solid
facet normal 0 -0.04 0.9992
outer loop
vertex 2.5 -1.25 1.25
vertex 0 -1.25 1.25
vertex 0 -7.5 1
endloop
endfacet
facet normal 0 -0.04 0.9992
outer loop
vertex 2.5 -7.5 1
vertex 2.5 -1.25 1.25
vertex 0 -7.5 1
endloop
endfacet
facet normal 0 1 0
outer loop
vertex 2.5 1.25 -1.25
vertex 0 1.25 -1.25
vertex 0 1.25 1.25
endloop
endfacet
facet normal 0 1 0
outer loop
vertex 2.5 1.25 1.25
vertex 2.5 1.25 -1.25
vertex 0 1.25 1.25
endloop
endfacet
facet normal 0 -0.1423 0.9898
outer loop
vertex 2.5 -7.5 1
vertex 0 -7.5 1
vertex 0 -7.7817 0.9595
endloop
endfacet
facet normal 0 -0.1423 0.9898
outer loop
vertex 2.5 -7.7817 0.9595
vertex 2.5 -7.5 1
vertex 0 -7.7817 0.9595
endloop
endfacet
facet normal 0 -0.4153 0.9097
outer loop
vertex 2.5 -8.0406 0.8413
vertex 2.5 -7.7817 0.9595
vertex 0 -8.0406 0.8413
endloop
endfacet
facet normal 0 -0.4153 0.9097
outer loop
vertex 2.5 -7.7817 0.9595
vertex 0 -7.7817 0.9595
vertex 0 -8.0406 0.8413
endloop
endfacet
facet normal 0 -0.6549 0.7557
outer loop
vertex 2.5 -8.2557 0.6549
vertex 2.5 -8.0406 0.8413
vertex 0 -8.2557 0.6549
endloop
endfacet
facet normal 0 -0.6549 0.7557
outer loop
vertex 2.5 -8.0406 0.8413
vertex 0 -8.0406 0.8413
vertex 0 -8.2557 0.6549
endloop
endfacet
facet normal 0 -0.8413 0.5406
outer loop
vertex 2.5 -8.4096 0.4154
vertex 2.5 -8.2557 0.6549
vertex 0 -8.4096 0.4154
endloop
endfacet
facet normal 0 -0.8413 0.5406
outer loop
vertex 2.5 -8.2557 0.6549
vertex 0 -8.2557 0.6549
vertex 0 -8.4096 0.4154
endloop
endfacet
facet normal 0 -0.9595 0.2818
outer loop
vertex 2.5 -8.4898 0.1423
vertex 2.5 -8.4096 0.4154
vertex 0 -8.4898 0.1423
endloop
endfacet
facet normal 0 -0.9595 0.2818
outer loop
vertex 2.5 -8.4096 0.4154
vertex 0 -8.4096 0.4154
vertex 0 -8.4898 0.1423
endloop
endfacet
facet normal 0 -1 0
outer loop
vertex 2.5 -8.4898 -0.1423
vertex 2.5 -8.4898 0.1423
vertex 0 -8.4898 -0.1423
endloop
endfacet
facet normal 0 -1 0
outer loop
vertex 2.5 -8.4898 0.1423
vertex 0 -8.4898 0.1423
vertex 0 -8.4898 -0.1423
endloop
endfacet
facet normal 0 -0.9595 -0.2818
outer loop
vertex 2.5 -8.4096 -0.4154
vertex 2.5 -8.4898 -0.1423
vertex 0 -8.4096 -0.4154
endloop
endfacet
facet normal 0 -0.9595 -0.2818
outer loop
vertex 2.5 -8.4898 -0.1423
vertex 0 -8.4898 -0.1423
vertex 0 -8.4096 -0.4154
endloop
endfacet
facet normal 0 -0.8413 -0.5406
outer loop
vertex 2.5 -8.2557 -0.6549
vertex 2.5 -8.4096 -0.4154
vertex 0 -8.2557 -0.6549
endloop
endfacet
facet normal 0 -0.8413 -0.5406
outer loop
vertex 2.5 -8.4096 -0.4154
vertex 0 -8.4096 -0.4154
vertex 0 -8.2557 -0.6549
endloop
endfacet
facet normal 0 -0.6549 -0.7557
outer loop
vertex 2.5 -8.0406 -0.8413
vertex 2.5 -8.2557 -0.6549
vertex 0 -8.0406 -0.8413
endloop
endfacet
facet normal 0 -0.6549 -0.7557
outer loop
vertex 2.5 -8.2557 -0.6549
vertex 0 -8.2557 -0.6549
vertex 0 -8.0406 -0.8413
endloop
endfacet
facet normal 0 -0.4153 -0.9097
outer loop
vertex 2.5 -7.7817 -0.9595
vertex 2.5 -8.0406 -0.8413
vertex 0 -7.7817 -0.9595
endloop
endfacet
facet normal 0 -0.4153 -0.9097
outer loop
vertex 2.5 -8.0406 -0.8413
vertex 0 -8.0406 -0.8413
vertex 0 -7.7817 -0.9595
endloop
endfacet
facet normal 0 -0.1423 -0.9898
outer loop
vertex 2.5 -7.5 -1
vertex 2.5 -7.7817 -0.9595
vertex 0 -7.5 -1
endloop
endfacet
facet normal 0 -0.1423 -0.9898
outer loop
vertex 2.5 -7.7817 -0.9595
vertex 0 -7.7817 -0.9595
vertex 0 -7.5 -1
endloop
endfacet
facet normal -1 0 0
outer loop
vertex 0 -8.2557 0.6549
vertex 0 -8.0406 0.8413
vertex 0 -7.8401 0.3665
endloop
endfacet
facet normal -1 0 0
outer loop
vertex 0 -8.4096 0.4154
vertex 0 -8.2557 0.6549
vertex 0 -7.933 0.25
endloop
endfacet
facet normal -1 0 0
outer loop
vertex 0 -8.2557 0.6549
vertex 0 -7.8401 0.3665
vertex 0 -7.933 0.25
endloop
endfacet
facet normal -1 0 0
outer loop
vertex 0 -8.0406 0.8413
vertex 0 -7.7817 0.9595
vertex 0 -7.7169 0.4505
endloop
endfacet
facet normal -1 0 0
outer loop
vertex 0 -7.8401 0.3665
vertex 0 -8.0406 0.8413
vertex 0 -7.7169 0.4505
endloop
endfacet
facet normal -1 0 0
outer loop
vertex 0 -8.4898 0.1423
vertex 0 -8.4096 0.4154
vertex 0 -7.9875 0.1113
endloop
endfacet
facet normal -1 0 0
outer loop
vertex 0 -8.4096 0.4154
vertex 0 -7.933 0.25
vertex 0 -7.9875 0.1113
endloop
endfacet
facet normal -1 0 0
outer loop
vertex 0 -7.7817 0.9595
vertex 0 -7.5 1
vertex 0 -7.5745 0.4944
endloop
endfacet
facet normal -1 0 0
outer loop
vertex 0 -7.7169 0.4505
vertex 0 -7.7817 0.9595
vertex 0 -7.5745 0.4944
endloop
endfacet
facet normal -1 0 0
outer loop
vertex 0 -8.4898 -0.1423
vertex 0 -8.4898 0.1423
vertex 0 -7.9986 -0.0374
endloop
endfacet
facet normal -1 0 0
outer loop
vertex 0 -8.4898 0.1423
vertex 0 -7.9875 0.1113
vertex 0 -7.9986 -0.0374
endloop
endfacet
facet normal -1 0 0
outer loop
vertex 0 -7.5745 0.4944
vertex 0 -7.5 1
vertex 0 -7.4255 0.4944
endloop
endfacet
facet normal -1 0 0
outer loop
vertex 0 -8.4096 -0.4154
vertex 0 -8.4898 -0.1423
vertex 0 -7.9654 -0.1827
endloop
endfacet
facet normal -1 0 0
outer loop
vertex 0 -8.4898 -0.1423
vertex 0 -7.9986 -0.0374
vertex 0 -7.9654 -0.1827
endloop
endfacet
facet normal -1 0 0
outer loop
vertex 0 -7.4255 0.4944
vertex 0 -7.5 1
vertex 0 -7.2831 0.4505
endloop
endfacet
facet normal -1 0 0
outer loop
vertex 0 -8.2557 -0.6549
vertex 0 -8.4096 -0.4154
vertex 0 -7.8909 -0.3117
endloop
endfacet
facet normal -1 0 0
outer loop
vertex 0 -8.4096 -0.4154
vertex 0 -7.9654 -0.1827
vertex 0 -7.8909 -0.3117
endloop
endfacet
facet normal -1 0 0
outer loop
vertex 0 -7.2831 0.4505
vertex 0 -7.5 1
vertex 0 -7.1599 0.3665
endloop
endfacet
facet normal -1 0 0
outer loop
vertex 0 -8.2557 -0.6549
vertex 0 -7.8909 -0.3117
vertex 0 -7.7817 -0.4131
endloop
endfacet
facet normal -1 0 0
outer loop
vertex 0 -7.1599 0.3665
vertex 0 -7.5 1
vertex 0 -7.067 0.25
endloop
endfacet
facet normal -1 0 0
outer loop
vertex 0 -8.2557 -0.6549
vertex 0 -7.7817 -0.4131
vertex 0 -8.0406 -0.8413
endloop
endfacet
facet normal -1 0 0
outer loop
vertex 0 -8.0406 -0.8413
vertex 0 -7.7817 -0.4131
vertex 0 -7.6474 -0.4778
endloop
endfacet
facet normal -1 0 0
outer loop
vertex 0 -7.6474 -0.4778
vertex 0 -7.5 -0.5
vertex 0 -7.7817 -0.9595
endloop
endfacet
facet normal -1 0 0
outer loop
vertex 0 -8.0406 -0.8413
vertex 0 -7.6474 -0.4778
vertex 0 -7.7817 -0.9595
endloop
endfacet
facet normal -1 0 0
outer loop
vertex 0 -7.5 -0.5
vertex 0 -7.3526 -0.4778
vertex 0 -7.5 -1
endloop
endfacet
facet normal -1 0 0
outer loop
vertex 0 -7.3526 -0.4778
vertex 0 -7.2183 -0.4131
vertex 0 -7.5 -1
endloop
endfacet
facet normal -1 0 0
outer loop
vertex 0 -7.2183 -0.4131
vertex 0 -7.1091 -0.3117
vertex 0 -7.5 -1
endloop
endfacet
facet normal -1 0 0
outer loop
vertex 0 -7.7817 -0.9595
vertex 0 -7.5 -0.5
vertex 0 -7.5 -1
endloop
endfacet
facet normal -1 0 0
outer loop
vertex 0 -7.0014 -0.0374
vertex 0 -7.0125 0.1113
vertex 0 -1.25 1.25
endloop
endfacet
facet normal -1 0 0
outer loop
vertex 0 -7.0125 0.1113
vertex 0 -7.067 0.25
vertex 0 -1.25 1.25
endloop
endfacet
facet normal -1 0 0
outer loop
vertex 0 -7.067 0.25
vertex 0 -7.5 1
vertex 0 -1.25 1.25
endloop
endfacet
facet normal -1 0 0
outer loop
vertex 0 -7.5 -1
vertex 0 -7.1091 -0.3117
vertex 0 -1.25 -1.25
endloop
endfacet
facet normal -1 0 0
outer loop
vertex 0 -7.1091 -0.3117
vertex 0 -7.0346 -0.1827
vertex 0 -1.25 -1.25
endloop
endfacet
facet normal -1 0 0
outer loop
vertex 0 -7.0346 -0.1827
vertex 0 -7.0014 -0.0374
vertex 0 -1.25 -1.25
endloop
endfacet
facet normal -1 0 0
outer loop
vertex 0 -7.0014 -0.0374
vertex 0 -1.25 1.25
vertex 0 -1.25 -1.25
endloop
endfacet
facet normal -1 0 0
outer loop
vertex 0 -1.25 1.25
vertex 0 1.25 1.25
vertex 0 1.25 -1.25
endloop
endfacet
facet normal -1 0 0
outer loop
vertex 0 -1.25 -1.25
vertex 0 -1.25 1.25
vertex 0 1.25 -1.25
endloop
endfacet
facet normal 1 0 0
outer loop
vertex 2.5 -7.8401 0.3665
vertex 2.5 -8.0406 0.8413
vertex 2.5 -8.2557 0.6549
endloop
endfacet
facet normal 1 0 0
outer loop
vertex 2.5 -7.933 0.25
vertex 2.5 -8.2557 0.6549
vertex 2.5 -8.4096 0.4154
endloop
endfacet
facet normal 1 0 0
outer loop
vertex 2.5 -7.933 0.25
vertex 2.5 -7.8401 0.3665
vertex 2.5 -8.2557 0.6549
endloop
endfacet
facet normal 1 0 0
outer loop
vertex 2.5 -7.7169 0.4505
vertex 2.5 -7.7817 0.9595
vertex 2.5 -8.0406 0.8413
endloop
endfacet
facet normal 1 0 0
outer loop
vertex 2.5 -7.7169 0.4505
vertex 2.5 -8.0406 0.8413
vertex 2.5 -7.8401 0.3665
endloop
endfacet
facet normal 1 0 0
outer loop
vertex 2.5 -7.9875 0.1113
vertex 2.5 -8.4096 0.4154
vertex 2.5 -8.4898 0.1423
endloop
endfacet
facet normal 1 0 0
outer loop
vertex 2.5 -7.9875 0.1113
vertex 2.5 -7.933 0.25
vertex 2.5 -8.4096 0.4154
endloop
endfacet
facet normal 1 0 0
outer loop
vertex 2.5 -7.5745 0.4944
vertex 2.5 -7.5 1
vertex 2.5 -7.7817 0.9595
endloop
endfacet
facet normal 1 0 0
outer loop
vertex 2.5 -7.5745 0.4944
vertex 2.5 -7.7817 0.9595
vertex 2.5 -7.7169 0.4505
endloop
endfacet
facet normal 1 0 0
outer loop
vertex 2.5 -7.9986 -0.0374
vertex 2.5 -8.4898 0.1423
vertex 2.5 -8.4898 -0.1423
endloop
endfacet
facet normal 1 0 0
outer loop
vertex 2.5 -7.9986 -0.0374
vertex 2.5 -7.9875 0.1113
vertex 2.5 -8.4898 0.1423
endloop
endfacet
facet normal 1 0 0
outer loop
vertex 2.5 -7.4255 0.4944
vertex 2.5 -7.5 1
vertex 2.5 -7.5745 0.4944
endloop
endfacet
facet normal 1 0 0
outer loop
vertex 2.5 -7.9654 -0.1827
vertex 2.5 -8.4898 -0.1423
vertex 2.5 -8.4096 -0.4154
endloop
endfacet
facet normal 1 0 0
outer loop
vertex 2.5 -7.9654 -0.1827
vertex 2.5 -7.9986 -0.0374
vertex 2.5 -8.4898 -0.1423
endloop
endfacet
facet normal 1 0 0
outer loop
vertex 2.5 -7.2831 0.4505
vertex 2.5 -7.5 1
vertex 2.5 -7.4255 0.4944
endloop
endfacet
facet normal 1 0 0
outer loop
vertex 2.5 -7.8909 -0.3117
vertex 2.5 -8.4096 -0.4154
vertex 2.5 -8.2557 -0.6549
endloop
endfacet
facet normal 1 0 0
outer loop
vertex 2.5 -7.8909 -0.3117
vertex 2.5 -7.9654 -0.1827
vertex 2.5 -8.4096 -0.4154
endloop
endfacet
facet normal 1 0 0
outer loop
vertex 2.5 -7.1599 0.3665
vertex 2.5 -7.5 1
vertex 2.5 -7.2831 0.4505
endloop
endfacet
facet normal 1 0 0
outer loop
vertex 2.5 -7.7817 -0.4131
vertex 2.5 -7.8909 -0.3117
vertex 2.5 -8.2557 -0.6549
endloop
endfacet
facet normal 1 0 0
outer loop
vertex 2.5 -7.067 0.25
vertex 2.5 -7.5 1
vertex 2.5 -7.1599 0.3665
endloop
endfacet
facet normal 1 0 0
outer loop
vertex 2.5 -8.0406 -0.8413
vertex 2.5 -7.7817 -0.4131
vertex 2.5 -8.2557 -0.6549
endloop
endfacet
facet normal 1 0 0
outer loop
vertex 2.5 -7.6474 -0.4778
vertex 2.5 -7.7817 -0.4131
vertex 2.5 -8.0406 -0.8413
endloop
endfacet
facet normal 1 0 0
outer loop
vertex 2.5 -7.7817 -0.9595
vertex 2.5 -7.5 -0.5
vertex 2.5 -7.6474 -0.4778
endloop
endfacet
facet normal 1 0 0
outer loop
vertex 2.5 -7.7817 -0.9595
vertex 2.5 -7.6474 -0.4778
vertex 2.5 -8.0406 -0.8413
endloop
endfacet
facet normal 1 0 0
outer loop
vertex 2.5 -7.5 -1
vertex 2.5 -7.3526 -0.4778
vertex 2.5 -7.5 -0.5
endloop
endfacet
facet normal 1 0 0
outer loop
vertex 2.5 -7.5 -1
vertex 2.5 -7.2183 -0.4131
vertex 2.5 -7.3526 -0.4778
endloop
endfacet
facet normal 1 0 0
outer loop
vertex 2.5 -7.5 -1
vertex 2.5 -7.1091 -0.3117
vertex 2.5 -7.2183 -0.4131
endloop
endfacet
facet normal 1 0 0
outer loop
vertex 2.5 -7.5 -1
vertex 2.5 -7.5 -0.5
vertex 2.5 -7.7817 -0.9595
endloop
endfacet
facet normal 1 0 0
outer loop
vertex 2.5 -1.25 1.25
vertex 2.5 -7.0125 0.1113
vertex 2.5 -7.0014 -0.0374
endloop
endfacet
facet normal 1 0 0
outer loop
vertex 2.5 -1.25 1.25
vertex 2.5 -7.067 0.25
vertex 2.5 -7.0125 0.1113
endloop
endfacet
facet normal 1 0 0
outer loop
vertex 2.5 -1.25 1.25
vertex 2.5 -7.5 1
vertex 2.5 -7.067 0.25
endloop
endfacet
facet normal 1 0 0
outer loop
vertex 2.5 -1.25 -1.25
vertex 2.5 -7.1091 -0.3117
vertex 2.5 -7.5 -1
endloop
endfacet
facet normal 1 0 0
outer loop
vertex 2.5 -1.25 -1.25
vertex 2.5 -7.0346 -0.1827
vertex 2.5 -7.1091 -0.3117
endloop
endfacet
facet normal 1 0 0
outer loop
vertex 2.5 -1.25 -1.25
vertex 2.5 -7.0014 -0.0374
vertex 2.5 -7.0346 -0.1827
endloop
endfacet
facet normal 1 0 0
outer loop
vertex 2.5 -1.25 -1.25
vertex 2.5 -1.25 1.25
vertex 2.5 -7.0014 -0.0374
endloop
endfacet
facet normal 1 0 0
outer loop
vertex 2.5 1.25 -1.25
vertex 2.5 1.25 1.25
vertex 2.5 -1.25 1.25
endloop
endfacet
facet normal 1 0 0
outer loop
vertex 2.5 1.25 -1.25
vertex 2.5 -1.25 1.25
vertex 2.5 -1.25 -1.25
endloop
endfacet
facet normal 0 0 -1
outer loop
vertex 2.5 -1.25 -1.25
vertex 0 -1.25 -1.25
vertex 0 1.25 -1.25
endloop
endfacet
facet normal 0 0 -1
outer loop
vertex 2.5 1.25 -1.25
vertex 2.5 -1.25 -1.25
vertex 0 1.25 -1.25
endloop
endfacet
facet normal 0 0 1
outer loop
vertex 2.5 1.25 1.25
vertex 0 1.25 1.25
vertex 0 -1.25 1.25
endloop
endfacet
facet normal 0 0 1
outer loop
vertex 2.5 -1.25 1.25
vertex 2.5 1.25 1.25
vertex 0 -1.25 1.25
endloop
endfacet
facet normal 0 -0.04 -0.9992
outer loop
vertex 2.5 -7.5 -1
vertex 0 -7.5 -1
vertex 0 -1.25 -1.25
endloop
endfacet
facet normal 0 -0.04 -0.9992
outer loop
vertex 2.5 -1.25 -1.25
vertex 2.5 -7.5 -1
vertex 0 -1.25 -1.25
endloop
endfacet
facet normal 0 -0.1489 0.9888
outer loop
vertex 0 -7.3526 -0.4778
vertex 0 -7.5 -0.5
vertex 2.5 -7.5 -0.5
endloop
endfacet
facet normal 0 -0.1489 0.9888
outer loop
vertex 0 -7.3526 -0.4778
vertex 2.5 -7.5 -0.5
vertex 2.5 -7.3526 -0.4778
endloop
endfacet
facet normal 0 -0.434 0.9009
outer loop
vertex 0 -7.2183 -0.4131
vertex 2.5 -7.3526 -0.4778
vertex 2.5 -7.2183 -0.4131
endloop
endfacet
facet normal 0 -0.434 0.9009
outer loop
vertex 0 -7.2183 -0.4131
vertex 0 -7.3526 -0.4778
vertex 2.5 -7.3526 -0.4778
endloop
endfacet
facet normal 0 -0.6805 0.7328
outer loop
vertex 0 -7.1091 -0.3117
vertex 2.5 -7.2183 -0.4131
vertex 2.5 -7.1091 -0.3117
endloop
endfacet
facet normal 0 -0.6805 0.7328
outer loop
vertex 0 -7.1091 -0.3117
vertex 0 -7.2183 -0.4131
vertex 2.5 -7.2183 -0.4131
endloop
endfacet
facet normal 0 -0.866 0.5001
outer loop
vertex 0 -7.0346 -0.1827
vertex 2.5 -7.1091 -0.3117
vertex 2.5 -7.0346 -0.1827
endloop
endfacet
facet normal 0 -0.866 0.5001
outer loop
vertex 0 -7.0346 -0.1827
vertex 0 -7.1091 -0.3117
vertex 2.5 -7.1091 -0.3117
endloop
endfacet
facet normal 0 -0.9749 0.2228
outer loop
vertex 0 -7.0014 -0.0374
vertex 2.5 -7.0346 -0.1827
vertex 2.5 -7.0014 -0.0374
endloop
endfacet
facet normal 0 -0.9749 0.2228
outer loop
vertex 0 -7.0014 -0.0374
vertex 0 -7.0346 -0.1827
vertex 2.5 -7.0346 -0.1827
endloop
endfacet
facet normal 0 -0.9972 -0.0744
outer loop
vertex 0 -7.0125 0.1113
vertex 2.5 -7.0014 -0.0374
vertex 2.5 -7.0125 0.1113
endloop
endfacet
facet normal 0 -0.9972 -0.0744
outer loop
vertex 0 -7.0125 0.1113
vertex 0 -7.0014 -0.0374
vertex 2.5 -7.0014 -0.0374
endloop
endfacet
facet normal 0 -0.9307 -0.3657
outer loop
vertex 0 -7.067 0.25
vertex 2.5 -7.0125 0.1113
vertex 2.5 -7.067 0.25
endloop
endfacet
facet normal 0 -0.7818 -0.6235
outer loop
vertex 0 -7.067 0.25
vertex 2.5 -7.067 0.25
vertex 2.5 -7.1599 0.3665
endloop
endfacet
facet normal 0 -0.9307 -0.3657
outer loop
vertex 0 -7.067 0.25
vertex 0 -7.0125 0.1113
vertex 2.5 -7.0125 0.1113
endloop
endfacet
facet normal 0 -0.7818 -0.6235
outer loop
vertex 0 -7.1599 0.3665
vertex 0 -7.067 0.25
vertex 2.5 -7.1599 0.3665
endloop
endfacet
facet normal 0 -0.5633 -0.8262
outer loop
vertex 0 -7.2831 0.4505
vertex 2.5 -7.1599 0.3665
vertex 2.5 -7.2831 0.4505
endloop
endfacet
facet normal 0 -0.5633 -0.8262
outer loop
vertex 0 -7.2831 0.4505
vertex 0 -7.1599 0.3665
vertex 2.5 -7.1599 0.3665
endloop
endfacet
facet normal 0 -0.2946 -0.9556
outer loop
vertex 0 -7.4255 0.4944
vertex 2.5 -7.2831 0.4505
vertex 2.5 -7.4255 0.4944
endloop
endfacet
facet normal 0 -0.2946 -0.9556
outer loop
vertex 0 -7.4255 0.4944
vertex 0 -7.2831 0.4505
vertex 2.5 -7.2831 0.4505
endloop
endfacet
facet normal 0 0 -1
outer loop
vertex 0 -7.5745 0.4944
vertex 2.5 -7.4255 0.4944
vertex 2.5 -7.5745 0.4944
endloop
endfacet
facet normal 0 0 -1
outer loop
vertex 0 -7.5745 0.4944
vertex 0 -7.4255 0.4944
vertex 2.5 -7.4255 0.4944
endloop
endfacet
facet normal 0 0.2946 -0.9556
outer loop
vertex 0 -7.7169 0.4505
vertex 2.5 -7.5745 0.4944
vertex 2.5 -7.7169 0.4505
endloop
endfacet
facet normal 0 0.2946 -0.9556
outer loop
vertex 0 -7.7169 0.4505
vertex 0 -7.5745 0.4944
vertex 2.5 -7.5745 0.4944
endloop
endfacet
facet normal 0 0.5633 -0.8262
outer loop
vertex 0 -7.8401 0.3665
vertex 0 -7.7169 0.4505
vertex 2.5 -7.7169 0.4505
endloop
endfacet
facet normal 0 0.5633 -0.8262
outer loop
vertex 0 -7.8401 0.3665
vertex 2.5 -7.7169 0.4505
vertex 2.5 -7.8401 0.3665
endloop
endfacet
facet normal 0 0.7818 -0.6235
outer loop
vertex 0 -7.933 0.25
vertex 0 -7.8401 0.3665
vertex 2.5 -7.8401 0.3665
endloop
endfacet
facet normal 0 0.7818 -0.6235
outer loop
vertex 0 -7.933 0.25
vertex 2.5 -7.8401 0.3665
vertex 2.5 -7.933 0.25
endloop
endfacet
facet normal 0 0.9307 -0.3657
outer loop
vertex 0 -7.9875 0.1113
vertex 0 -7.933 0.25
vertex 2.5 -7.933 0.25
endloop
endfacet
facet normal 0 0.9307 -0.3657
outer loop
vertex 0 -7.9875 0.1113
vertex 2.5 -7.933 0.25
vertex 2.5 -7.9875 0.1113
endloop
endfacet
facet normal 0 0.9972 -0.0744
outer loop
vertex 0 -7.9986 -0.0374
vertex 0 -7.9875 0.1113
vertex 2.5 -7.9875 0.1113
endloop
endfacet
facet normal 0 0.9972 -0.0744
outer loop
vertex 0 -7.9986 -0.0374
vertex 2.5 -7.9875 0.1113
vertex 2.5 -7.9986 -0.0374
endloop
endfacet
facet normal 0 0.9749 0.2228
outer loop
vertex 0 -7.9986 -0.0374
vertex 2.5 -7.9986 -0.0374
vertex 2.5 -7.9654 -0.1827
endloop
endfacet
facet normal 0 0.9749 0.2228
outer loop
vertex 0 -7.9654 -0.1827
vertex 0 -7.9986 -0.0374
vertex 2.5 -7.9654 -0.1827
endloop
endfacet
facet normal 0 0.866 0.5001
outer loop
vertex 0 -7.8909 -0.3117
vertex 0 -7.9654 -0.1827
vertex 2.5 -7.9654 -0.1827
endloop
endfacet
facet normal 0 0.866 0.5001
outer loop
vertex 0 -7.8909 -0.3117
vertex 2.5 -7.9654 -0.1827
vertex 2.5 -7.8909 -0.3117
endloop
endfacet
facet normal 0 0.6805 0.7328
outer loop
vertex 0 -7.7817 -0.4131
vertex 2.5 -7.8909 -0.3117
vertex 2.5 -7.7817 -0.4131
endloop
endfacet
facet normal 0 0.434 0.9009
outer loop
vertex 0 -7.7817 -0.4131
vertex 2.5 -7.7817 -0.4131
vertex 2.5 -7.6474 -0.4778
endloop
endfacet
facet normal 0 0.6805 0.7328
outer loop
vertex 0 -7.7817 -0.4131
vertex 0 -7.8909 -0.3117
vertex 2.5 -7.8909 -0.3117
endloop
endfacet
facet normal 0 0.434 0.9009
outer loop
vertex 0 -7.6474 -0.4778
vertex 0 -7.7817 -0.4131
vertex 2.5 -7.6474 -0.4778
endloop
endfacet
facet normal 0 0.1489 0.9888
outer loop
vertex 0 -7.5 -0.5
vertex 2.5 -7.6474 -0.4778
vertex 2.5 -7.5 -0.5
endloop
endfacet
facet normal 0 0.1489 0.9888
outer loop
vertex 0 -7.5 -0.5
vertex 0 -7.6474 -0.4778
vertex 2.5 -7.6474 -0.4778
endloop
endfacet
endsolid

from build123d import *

# Parameters (mm, degrees)
CROQUIS1_R              = 0.5
SALIENTE_EXTRUIR1_DEPTH = 2.5


with BuildPart() as part:
    # Croquis1 → Saliente-Extruir1 (new body)
    with BuildSketch(Plane(origin=(0, 0, 0), x_dir=(0, 0, -1), z_dir=(1, 0, 0))):
        with BuildLine():
            Line((1.25, 1.25), (-1.25, 1.25))
            Line((-1.25, 1.25), (-1.25, -1.25))
            Line((-1.25, -1.25), (-1, -7.5))
            ThreePointArc((-1, -7.5), (0, -8.5), (1, -7.5))
            Line((1, -7.5), (1.25, -1.25))
            Line((1.25, -1.25), (1.25, 1.25))
        make_face()
        with Locations((0, -7.5)):
            Circle(CROQUIS1_R, mode=Mode.SUBTRACT)
    extrude(amount=SALIENTE_EXTRUIR1_DEPTH)


solid = part.part
